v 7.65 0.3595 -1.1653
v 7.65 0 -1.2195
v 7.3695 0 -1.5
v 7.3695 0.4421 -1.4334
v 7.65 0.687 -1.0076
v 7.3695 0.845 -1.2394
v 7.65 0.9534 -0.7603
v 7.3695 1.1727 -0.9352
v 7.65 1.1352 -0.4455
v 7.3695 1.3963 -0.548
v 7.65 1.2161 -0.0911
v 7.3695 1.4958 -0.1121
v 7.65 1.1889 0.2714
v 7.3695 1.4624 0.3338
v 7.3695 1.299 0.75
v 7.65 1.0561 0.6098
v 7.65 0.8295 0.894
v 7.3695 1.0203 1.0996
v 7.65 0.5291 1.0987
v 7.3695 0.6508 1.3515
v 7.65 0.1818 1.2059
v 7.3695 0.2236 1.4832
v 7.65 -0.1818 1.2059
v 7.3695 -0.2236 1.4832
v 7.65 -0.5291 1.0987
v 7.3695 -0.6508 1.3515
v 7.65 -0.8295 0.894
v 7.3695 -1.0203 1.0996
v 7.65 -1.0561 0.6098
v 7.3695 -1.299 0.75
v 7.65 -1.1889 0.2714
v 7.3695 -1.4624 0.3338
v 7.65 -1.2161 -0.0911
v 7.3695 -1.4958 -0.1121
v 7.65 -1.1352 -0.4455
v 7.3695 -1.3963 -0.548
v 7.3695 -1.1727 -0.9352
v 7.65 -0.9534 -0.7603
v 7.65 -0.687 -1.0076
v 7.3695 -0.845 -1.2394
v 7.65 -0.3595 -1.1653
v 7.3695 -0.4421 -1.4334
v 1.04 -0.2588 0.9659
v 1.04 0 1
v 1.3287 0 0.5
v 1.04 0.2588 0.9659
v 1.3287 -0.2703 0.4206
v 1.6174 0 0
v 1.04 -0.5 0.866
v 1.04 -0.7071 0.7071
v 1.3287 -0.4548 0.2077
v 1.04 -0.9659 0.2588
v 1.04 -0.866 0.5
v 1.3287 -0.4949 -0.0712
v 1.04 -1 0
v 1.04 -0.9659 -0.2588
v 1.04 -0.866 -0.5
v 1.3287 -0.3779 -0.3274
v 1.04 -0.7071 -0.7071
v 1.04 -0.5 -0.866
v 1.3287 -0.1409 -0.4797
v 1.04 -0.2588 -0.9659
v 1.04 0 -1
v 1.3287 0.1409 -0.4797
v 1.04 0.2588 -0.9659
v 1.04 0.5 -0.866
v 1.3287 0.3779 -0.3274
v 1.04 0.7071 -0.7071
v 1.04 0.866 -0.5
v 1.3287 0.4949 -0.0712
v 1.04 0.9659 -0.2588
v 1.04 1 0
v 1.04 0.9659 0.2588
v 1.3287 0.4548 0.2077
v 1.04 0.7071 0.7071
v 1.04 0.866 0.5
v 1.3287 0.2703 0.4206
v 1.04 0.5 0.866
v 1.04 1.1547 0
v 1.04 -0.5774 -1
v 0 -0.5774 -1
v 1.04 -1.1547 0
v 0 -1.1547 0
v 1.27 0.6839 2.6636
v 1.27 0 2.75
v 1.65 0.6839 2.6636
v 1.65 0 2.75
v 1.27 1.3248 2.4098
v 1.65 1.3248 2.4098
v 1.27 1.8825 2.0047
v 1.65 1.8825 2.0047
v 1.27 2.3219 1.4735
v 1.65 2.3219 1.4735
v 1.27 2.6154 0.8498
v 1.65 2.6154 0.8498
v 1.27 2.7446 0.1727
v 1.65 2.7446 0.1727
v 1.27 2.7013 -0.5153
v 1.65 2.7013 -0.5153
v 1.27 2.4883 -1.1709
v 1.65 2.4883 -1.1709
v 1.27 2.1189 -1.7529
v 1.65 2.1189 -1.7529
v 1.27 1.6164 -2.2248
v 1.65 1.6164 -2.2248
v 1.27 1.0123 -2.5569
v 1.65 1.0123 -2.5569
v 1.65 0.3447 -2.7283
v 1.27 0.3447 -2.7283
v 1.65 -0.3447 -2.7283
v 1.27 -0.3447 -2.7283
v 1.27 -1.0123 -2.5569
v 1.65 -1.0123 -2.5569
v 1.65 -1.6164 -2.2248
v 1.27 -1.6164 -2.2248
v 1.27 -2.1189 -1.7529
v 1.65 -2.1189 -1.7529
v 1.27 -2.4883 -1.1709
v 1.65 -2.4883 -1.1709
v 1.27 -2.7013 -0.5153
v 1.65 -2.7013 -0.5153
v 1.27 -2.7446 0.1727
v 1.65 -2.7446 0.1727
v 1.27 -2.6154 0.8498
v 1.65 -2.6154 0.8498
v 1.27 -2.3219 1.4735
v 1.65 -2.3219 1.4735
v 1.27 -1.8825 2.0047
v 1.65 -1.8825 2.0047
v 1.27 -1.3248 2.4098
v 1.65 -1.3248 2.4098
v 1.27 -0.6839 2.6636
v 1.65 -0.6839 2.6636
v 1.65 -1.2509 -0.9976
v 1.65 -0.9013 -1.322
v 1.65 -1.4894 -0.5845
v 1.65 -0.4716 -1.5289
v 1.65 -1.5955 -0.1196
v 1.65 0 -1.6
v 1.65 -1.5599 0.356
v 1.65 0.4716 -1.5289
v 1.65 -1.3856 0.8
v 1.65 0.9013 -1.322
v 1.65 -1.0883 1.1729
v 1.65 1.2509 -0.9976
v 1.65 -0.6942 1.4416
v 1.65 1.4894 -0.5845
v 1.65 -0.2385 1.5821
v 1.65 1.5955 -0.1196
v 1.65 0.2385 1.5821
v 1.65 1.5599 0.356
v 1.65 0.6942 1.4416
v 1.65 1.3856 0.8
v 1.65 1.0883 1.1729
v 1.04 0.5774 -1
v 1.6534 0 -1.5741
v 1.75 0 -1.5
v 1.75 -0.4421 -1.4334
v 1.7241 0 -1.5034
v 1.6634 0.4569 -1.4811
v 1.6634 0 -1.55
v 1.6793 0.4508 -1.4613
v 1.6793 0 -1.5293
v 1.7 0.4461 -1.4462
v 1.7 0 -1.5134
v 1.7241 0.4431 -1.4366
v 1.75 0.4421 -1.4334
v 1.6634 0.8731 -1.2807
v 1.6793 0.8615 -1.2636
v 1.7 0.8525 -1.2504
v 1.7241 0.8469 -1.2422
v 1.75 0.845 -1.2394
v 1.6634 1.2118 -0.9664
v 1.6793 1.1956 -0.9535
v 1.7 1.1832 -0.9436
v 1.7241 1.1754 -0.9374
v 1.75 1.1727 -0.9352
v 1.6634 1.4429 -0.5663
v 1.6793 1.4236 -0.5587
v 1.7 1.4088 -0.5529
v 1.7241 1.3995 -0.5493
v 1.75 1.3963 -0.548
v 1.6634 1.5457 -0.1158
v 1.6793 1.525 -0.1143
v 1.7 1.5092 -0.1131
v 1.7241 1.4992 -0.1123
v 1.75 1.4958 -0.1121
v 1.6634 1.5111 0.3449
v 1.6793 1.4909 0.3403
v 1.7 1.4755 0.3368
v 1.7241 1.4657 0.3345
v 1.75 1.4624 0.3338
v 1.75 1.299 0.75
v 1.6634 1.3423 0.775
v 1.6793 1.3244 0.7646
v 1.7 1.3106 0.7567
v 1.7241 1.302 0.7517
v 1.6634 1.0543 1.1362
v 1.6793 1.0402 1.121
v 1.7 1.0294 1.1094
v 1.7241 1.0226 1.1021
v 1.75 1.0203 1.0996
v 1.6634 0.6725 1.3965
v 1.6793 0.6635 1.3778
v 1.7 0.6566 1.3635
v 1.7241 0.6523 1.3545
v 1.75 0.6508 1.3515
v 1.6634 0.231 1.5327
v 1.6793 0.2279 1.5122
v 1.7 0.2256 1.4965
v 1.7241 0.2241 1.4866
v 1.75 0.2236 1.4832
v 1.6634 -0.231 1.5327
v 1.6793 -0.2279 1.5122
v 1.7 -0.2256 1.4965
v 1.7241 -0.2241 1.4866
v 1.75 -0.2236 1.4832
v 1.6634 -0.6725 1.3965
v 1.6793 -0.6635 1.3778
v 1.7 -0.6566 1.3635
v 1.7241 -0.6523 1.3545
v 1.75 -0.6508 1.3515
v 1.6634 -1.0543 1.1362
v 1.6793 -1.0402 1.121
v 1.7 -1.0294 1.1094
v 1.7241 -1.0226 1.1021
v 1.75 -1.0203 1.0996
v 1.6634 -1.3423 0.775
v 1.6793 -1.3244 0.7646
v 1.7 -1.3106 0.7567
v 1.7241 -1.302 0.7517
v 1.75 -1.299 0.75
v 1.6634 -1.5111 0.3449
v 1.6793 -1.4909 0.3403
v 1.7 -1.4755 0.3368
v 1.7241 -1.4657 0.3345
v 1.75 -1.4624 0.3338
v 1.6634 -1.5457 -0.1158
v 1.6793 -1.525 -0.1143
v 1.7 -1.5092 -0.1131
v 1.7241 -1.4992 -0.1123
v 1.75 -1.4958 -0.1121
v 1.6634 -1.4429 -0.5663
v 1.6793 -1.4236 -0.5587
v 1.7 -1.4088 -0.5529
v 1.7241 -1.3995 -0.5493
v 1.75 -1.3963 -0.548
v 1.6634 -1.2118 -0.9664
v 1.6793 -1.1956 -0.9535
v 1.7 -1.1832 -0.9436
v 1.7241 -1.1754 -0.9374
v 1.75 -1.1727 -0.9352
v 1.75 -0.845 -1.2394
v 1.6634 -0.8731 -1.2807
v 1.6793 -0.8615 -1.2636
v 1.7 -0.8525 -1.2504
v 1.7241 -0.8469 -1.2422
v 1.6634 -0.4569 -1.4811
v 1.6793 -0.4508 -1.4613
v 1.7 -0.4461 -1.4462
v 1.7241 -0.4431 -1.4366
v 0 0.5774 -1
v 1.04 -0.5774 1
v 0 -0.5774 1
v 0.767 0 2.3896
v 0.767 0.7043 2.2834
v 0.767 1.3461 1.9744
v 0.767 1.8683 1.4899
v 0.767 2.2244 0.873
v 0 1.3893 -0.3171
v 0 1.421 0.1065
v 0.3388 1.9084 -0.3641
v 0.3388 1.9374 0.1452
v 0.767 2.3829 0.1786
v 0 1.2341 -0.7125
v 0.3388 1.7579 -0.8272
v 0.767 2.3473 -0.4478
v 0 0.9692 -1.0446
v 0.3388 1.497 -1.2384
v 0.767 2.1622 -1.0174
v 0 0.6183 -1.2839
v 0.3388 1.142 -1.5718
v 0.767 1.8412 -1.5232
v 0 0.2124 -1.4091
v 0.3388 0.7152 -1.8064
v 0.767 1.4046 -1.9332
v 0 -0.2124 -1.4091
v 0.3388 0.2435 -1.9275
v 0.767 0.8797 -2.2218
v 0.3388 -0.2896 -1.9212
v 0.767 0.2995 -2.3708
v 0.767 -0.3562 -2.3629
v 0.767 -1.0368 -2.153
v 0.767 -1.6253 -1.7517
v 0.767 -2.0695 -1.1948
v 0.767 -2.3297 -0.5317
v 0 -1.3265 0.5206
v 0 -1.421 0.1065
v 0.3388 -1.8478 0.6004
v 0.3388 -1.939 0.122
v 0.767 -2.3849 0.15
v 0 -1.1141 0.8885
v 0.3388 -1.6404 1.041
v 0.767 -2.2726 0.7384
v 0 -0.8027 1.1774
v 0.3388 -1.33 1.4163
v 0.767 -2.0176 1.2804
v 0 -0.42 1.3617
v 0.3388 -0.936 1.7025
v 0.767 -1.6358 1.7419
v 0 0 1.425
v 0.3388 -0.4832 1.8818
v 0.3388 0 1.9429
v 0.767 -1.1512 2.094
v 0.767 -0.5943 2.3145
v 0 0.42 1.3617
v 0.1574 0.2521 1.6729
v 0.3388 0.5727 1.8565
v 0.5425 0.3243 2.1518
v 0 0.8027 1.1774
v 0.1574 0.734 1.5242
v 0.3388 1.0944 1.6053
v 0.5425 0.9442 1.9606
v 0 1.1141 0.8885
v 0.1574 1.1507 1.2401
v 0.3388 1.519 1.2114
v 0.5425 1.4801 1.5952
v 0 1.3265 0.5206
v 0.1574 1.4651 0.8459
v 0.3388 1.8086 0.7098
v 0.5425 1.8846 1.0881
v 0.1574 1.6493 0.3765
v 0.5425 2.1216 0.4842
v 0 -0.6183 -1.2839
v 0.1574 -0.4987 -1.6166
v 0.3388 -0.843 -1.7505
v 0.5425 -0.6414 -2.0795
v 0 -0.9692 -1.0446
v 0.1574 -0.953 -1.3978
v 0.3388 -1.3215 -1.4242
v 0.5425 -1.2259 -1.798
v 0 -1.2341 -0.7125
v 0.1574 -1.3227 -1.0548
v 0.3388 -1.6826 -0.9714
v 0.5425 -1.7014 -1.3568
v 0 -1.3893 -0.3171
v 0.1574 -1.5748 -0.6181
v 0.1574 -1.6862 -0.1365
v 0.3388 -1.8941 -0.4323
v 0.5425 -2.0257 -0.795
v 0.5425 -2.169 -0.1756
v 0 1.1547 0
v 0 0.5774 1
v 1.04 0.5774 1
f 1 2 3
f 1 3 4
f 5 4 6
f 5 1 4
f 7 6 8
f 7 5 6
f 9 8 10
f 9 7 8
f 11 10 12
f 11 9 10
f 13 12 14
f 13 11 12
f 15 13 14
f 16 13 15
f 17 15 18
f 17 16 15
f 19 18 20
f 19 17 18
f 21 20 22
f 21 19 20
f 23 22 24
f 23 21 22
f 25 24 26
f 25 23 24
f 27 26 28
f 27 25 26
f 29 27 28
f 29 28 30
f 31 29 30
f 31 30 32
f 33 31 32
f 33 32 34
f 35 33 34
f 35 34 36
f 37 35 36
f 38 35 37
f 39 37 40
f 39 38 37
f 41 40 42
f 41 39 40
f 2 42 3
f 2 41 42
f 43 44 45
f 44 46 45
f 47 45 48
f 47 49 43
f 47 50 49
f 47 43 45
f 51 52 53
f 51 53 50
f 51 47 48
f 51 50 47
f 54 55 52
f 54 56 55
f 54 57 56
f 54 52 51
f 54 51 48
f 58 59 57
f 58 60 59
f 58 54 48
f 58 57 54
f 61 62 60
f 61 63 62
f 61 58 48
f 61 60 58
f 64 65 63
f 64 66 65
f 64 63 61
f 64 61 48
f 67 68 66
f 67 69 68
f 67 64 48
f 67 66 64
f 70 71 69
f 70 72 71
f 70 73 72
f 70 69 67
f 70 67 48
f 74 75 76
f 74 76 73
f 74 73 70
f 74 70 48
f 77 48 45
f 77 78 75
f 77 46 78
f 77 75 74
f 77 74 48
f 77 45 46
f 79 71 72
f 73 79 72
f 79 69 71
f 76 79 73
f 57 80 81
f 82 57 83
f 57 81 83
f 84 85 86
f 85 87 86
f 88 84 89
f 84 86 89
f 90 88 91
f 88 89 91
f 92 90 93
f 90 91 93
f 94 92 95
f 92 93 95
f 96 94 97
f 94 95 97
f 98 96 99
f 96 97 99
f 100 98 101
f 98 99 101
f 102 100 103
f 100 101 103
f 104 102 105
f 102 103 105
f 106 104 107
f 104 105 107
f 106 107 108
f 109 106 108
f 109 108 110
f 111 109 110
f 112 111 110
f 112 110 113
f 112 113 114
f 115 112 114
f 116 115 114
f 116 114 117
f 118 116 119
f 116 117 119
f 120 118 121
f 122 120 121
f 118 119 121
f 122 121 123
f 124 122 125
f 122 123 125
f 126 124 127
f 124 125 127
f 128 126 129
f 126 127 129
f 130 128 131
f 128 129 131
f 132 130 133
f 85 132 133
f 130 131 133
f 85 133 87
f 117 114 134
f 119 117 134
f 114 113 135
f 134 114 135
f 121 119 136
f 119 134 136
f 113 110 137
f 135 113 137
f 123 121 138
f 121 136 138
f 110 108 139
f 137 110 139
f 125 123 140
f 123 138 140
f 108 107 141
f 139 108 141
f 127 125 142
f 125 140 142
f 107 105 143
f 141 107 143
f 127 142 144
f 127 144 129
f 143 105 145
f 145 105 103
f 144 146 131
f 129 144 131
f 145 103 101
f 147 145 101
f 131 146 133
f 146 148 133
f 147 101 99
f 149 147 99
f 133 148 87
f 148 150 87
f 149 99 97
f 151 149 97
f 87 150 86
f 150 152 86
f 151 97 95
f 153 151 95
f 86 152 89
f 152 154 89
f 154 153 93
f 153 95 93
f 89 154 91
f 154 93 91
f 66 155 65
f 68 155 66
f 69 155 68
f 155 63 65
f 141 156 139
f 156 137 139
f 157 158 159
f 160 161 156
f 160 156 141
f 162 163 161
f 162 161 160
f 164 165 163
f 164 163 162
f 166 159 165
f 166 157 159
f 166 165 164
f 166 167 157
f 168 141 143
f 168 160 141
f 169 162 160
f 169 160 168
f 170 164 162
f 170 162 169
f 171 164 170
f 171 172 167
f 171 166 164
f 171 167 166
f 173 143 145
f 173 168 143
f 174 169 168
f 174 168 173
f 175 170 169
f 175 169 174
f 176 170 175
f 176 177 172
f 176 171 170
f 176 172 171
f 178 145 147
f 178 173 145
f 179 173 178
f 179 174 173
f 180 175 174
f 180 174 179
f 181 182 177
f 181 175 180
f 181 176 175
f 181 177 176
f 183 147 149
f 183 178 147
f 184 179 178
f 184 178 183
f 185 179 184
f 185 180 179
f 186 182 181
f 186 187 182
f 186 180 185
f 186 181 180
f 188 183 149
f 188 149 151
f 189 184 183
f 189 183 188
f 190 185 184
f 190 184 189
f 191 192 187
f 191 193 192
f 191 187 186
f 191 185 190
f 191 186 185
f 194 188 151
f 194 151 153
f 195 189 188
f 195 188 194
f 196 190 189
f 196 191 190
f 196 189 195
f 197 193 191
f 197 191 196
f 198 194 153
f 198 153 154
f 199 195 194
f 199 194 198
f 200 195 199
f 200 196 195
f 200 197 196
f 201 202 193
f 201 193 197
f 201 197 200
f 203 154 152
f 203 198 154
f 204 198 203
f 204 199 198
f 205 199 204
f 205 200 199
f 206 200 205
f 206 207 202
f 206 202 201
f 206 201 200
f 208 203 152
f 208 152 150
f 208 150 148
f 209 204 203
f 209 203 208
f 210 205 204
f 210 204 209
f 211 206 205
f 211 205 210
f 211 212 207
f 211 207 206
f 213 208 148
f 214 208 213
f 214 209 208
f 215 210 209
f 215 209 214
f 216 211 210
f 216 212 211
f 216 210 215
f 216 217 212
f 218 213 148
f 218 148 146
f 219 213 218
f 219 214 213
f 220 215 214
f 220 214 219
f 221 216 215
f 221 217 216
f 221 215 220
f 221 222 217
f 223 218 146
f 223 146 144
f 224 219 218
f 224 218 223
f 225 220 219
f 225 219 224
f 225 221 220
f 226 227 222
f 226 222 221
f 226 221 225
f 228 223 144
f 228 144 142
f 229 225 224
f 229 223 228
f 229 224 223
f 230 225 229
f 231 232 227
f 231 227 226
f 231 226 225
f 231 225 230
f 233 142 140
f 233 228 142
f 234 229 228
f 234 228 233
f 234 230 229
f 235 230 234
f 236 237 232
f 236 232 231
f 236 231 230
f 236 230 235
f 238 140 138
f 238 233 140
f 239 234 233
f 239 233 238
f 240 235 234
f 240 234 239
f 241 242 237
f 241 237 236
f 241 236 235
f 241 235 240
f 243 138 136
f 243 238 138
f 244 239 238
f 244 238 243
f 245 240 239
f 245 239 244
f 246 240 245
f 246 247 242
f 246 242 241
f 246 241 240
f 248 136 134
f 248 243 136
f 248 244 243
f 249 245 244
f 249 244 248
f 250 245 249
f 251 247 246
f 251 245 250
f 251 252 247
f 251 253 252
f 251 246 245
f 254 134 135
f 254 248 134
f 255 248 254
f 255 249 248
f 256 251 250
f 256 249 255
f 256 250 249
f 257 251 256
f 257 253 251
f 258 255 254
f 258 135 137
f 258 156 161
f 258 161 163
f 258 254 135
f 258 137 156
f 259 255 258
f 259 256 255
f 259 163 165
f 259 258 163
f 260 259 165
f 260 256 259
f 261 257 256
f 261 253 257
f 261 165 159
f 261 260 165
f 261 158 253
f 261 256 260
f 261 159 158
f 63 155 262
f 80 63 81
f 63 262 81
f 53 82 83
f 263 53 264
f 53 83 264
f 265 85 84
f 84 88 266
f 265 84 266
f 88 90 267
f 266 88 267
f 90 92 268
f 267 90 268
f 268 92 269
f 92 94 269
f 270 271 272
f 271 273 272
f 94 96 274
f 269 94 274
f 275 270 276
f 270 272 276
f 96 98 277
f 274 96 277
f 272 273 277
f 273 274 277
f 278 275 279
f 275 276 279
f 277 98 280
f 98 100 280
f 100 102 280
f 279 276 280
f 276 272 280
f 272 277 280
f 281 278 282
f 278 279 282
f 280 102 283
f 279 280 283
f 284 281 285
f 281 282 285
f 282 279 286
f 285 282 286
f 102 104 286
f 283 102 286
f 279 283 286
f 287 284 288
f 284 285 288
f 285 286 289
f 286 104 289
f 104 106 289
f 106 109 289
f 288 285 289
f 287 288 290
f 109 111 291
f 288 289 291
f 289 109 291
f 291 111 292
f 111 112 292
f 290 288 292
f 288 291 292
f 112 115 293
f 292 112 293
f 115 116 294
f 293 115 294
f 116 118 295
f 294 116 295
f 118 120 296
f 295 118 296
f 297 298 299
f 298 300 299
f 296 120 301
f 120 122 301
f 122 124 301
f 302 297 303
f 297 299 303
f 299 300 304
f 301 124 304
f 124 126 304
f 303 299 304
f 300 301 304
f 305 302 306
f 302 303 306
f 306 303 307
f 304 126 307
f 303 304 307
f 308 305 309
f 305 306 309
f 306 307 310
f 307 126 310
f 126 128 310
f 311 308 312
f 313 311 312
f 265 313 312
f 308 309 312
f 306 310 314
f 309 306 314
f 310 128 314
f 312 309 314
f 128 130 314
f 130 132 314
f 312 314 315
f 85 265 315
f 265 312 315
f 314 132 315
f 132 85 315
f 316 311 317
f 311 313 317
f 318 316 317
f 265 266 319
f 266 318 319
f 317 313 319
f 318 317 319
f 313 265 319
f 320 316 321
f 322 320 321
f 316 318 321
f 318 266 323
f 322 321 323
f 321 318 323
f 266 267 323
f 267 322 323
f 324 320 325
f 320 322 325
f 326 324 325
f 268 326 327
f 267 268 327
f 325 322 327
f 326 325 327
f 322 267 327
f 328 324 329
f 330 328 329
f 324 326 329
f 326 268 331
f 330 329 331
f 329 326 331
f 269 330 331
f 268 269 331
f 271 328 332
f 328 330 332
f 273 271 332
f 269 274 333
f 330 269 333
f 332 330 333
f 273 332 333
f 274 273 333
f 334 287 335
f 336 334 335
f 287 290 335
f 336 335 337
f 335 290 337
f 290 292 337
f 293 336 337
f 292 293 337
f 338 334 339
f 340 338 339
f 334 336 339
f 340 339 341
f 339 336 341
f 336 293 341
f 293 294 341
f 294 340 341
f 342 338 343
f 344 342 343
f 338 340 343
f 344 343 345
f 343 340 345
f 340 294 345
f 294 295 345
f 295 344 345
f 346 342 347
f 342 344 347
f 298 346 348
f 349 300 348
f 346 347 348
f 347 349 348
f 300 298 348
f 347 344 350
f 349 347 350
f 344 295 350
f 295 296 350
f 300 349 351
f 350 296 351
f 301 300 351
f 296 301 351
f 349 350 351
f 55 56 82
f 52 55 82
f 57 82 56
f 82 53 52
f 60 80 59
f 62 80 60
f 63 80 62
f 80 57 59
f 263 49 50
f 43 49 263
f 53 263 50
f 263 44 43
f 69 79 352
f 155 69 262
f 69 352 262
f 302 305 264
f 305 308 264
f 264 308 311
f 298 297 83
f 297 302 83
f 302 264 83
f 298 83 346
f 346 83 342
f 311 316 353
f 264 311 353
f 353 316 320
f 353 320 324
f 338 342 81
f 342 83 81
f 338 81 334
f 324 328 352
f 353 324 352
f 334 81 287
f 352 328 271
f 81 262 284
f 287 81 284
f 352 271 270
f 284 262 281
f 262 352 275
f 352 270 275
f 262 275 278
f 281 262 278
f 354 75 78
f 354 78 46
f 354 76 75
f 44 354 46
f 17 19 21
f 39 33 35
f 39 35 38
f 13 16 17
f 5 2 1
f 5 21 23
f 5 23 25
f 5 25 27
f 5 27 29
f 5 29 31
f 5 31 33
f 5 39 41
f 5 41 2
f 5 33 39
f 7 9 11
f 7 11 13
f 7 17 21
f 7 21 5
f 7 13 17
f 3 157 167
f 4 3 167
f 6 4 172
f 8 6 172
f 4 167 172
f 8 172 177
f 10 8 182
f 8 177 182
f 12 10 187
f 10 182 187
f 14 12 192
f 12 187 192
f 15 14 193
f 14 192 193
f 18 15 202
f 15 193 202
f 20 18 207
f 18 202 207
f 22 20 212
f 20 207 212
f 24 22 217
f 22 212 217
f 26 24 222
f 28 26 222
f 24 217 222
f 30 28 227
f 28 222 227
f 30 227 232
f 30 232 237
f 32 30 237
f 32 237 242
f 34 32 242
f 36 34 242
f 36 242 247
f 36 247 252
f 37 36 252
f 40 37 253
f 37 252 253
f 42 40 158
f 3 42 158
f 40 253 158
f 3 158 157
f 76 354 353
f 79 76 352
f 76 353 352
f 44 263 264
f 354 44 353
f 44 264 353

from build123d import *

# Parameters (mm, degrees)
CUT_EXTRUDE1_DEPTH        = 1.04
SKETCH4_R                 = 1.5
LARGO_Y_ANCHO_ROSCA_DEPTH = 6
FILLET1_R                 = 0.1
CHAMFER1_SIZE             = 0.2805


with BuildPart() as part:
    # Sketch1 → Revolve1 (revolve)
    with BuildSketch(Plane(origin=(0, 0, 0), x_dir=(-1, 0, 0), z_dir=(0, 0, -1)), mode=Mode.PRIVATE) as revolve1_sk:
        with BuildLine():
            Line((-1.65, 2.75), (-1.65, 0))
            Line((-1.65, 0), (0, 0))
            Line((0, 0), (0, 1.425))
            ThreePointArc((0, 1.425), (-0.542530893, 2.176130767), (-1.27, 2.75))
            Line((-1.27, 2.75), (-1.65, 2.75))
        make_face()
    revolve(revolve1_sk.sketch.rotate(Axis((1.65, 0, 0), (-1, 0, 0)), 270), axis=Axis((1.65, 0, 0), (-1, 0, 0)))

    # Sketch2 → Cut-Extrude1 (cut)
    with BuildSketch(Plane.ZY):
        Polygon((-1, 0.577350269), (-1, -0.577350269), (0, -1.154700538), (1, -0.577350269), (1, 0.577350269), (0, 1.154700538), align=None)
    extrude(amount=-CUT_EXTRUDE1_DEPTH, mode=Mode.SUBTRACT)

    # Sketch3 → Cut-Revolve1 (revolve, cut)
    with BuildSketch(Plane.XY, mode=Mode.PRIVATE) as cut_revolve1_sk:
        Polygon((1.04, 1), (1.04, 0), (1.617350269, 0), align=None)
    revolve(cut_revolve1_sk.sketch.rotate(Axis((1.04, 0, 0), (1, 0, 0)), 90), axis=Axis((1.04, 0, 0), (1, 0, 0)), mode=Mode.SUBTRACT)

    # Sketch4 → Largo y Ancho rosca (add)
    with BuildSketch(Plane(origin=(1.65, 0, 0), x_dir=(0, 0, -1), z_dir=(1, 0, 0))):
        Circle(SKETCH4_R)
    extrude(amount=LARGO_Y_ANCHO_ROSCA_DEPTH)

    # Fillet1
    fillet1_edges = [part.edges().sort_by_distance(p)[0] for p in [
        (1.65, 0, 1.5),
    ]]
    fillet(fillet1_edges, radius=FILLET1_R)

    # Chamfer1
    chamfer1_edges = [part.edges().sort_by_distance(p)[0] for p in [
        (7.65, 0, 1.5),
    ]]
    chamfer(chamfer1_edges, length=CHAMFER1_SIZE)


solid = part.part
